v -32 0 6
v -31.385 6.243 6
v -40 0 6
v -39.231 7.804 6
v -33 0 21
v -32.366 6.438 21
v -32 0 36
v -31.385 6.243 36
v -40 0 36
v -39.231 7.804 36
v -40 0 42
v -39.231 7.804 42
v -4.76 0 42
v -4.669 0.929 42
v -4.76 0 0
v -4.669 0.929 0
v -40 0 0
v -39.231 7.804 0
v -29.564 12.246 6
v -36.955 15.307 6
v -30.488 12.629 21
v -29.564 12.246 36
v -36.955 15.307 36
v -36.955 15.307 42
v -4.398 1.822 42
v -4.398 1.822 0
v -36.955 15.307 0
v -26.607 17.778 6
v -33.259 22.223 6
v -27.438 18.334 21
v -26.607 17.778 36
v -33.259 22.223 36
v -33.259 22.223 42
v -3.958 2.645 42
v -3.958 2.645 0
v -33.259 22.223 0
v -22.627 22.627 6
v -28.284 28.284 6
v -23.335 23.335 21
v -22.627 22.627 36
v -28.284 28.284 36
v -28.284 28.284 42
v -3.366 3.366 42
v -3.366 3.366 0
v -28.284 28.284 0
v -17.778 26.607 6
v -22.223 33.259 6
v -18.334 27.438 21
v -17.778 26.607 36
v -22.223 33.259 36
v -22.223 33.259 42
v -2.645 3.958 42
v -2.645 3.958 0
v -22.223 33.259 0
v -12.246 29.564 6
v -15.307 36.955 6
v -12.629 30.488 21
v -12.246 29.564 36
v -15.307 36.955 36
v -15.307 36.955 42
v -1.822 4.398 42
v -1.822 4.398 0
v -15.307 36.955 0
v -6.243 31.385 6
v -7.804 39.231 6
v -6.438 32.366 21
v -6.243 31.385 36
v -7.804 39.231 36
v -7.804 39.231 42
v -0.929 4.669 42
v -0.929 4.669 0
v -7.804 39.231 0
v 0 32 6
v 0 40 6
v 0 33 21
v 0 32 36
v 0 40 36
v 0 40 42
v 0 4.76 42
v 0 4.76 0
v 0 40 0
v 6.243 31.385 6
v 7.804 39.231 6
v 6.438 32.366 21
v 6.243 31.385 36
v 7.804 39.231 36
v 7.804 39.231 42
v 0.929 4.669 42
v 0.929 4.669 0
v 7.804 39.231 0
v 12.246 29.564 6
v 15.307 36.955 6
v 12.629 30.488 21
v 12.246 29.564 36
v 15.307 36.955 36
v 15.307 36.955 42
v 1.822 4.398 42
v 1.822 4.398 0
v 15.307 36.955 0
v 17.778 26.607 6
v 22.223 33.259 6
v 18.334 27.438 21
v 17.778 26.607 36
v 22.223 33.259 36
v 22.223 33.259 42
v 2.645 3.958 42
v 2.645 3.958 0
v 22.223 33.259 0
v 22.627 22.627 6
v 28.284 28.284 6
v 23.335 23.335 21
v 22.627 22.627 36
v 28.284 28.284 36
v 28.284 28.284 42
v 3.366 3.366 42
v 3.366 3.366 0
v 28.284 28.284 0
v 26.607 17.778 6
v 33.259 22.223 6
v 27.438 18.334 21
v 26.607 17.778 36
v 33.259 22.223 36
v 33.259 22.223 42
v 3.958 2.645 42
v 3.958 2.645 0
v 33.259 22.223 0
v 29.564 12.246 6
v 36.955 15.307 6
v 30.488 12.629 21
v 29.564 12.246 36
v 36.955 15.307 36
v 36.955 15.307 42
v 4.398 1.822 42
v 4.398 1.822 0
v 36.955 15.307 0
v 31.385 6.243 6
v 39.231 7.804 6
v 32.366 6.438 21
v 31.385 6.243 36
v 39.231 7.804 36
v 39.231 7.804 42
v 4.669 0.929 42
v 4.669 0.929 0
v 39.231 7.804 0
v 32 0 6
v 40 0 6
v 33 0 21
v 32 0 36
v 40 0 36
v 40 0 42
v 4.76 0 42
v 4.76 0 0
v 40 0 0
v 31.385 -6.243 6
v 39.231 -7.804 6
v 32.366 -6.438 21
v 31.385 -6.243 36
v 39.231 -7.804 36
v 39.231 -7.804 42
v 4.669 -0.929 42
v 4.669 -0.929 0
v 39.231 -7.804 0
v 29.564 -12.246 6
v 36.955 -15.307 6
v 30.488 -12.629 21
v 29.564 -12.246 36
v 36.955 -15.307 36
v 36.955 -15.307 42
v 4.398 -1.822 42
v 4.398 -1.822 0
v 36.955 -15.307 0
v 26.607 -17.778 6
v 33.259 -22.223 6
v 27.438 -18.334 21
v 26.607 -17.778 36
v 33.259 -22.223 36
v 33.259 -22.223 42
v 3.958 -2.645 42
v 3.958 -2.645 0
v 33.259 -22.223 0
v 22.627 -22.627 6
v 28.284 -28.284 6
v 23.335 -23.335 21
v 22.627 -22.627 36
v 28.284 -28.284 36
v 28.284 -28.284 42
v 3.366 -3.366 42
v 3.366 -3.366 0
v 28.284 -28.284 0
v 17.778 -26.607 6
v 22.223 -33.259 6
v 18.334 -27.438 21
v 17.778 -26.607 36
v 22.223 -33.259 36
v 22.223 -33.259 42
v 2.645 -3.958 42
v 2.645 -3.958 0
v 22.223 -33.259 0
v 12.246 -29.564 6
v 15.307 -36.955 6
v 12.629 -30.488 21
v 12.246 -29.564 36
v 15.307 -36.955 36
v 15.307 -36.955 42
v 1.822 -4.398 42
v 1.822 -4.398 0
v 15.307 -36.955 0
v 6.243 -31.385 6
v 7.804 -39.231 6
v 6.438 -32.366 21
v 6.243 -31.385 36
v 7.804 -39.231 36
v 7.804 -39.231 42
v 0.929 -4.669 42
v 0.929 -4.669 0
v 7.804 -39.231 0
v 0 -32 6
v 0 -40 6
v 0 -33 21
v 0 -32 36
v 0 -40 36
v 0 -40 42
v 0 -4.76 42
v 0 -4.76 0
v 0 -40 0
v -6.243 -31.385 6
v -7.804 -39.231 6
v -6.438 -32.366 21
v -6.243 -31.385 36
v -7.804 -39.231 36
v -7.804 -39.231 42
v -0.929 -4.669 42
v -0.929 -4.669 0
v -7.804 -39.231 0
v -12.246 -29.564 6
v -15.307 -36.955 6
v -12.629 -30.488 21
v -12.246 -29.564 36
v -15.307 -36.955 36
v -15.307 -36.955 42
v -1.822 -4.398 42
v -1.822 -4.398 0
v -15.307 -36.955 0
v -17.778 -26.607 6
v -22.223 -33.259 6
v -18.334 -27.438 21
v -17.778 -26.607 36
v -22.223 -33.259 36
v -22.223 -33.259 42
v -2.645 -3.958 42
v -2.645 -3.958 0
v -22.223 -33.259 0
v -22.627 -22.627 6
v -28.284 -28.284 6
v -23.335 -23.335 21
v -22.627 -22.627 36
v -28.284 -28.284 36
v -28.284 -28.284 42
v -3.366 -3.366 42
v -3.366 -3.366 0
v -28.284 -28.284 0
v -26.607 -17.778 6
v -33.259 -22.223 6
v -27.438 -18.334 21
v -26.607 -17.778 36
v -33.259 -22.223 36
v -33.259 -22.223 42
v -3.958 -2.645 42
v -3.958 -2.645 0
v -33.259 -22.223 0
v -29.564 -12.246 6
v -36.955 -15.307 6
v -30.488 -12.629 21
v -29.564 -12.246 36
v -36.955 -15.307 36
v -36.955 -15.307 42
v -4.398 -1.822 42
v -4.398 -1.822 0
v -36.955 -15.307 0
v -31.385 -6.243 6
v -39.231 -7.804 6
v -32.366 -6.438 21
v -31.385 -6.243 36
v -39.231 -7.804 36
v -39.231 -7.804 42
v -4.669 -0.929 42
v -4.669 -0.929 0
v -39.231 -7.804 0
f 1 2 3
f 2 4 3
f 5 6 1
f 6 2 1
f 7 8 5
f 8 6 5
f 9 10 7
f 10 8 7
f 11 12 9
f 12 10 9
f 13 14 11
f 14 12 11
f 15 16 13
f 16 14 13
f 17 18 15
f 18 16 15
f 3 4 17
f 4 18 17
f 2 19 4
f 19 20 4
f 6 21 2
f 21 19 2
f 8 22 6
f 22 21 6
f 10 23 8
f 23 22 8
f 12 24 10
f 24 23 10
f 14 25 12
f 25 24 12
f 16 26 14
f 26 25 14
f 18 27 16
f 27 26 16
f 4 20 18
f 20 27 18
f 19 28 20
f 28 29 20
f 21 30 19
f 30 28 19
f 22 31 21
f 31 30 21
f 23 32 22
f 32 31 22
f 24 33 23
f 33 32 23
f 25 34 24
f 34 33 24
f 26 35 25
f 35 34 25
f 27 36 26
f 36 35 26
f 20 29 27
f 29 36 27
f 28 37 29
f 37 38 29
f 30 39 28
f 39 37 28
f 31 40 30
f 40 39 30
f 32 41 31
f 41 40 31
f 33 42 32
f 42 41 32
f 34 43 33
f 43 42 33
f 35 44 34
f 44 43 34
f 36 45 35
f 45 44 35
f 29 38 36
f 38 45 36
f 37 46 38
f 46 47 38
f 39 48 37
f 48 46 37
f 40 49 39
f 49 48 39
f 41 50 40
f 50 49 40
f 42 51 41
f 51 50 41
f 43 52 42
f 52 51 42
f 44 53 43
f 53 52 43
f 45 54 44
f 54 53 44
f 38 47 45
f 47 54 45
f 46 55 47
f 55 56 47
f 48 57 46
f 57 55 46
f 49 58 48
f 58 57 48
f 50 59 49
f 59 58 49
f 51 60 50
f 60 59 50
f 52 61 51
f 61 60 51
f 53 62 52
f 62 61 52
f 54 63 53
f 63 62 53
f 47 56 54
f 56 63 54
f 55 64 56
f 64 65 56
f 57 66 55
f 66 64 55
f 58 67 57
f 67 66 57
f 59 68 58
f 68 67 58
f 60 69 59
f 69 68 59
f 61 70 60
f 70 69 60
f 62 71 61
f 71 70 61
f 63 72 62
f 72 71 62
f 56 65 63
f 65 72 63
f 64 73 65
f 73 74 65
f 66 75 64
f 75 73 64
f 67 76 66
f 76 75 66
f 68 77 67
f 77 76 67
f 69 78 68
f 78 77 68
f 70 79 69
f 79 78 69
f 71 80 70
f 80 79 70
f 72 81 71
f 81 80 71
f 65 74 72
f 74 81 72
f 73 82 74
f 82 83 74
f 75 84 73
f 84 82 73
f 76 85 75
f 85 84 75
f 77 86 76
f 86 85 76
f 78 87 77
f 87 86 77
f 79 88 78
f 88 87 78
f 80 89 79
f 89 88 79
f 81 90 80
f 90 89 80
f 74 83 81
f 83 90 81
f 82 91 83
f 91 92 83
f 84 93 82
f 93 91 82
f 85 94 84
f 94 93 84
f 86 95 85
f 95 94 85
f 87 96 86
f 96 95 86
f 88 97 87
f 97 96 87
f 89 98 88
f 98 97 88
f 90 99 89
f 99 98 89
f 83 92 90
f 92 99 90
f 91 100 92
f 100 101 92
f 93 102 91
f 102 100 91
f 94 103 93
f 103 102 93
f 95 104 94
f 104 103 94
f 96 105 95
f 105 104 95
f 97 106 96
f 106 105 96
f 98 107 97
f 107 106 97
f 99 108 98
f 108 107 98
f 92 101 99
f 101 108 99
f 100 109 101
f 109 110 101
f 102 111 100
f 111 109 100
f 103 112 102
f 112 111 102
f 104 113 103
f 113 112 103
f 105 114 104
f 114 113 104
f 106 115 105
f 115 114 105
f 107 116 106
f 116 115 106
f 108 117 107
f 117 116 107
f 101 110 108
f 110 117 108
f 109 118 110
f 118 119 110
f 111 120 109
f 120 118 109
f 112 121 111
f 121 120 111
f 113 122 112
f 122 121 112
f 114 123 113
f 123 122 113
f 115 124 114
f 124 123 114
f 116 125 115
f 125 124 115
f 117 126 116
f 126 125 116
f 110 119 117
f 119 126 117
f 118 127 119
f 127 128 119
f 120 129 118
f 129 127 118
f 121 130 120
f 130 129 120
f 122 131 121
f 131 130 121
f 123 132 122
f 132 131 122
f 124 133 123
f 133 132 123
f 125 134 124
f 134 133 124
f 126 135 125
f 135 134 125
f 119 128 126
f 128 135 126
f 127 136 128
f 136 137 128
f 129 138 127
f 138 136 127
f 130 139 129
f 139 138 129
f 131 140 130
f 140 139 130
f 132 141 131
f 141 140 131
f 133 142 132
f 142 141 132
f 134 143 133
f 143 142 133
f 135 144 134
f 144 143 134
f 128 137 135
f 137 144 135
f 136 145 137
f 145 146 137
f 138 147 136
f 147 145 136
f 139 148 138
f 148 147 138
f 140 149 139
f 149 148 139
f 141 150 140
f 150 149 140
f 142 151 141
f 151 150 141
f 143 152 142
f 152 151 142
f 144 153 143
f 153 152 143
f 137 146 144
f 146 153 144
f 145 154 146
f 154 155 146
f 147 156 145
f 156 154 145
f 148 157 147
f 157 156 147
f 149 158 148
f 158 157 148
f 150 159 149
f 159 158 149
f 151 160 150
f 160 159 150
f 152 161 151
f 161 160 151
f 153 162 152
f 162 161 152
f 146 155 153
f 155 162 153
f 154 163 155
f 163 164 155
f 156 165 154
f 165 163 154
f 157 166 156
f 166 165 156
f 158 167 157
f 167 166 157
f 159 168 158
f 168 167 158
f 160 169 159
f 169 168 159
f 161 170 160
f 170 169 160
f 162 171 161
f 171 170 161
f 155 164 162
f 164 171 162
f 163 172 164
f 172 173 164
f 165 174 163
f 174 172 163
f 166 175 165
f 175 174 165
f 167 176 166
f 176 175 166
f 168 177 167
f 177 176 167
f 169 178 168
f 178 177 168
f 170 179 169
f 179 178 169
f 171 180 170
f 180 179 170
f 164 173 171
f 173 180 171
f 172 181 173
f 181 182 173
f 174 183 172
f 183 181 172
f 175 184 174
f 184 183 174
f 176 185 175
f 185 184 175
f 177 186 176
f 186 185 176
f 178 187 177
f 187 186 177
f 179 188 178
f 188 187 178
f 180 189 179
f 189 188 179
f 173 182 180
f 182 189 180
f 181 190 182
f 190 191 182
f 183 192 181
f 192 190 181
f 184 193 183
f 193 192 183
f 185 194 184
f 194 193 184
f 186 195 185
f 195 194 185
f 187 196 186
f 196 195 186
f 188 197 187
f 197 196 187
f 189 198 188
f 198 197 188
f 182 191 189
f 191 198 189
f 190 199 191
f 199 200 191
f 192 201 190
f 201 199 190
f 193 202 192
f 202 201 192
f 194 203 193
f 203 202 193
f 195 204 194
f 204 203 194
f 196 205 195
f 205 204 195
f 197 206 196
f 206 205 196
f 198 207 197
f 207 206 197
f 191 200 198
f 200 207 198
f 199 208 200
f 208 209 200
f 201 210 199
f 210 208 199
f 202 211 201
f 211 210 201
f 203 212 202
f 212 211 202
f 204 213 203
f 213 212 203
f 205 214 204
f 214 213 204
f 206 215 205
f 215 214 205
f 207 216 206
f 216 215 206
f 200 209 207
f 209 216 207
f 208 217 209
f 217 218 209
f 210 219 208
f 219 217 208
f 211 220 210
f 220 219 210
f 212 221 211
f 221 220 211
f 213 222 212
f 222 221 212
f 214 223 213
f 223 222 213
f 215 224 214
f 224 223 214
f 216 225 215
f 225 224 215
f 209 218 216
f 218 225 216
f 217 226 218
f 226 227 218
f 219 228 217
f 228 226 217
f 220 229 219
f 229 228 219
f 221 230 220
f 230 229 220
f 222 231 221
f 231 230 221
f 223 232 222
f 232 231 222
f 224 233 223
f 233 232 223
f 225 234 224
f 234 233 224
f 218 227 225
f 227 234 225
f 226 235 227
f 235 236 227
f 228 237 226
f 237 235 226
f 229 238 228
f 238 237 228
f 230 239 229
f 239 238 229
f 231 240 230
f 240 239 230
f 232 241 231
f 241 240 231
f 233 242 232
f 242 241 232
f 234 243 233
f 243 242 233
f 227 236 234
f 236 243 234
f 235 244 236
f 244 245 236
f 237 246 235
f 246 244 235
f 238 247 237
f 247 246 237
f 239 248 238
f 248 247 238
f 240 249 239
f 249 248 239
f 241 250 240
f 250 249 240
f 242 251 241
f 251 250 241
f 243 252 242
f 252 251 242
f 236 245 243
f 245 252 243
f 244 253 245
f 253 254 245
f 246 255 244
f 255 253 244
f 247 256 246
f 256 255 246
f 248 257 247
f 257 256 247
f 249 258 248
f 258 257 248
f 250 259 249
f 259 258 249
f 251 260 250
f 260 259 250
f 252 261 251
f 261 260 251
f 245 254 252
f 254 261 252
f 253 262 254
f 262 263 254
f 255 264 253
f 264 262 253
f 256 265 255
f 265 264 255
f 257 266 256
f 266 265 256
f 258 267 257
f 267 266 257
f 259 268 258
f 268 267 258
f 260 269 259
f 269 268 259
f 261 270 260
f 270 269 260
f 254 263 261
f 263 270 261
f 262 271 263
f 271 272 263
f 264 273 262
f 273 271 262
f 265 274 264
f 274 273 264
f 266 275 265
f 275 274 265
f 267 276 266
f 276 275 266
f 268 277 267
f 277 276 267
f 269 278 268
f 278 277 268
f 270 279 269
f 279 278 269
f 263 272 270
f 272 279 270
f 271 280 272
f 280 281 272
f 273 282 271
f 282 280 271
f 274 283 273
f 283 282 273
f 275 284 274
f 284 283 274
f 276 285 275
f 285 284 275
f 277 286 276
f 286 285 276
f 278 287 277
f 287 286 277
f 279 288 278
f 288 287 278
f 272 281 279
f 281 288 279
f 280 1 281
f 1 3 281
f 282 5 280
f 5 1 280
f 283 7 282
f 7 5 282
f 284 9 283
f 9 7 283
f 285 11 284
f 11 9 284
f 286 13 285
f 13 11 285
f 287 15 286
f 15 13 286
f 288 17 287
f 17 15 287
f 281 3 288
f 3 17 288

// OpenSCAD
$fn = 32;

// ----------------------------------------------------------------------
// Belt roller: 64 mm barrel, 42 mm wide, bore 9.52 mm
// ----------------------------------------------------------------------

// --- parameters (mm) ---
bore_d = 9.52;            // bore
barrel_d = 64;            // barrel diameter
roller_w = 42;            // roller width
flange_d = 80;            // flange diameter
flange_t = 6;             // flange thickness
hub_d = 25.52;            // hub diameter

roller_profile = [[4.76, 0], [40, 0], [40, 6], [32, 6], [33, 21], [32, 36], [40, 36], [40, 42], [4.76, 42]];

/* the profile stays clear of the axis, so the bore comes out of the revolve */
rotate_extrude() polygon(roller_profile);
